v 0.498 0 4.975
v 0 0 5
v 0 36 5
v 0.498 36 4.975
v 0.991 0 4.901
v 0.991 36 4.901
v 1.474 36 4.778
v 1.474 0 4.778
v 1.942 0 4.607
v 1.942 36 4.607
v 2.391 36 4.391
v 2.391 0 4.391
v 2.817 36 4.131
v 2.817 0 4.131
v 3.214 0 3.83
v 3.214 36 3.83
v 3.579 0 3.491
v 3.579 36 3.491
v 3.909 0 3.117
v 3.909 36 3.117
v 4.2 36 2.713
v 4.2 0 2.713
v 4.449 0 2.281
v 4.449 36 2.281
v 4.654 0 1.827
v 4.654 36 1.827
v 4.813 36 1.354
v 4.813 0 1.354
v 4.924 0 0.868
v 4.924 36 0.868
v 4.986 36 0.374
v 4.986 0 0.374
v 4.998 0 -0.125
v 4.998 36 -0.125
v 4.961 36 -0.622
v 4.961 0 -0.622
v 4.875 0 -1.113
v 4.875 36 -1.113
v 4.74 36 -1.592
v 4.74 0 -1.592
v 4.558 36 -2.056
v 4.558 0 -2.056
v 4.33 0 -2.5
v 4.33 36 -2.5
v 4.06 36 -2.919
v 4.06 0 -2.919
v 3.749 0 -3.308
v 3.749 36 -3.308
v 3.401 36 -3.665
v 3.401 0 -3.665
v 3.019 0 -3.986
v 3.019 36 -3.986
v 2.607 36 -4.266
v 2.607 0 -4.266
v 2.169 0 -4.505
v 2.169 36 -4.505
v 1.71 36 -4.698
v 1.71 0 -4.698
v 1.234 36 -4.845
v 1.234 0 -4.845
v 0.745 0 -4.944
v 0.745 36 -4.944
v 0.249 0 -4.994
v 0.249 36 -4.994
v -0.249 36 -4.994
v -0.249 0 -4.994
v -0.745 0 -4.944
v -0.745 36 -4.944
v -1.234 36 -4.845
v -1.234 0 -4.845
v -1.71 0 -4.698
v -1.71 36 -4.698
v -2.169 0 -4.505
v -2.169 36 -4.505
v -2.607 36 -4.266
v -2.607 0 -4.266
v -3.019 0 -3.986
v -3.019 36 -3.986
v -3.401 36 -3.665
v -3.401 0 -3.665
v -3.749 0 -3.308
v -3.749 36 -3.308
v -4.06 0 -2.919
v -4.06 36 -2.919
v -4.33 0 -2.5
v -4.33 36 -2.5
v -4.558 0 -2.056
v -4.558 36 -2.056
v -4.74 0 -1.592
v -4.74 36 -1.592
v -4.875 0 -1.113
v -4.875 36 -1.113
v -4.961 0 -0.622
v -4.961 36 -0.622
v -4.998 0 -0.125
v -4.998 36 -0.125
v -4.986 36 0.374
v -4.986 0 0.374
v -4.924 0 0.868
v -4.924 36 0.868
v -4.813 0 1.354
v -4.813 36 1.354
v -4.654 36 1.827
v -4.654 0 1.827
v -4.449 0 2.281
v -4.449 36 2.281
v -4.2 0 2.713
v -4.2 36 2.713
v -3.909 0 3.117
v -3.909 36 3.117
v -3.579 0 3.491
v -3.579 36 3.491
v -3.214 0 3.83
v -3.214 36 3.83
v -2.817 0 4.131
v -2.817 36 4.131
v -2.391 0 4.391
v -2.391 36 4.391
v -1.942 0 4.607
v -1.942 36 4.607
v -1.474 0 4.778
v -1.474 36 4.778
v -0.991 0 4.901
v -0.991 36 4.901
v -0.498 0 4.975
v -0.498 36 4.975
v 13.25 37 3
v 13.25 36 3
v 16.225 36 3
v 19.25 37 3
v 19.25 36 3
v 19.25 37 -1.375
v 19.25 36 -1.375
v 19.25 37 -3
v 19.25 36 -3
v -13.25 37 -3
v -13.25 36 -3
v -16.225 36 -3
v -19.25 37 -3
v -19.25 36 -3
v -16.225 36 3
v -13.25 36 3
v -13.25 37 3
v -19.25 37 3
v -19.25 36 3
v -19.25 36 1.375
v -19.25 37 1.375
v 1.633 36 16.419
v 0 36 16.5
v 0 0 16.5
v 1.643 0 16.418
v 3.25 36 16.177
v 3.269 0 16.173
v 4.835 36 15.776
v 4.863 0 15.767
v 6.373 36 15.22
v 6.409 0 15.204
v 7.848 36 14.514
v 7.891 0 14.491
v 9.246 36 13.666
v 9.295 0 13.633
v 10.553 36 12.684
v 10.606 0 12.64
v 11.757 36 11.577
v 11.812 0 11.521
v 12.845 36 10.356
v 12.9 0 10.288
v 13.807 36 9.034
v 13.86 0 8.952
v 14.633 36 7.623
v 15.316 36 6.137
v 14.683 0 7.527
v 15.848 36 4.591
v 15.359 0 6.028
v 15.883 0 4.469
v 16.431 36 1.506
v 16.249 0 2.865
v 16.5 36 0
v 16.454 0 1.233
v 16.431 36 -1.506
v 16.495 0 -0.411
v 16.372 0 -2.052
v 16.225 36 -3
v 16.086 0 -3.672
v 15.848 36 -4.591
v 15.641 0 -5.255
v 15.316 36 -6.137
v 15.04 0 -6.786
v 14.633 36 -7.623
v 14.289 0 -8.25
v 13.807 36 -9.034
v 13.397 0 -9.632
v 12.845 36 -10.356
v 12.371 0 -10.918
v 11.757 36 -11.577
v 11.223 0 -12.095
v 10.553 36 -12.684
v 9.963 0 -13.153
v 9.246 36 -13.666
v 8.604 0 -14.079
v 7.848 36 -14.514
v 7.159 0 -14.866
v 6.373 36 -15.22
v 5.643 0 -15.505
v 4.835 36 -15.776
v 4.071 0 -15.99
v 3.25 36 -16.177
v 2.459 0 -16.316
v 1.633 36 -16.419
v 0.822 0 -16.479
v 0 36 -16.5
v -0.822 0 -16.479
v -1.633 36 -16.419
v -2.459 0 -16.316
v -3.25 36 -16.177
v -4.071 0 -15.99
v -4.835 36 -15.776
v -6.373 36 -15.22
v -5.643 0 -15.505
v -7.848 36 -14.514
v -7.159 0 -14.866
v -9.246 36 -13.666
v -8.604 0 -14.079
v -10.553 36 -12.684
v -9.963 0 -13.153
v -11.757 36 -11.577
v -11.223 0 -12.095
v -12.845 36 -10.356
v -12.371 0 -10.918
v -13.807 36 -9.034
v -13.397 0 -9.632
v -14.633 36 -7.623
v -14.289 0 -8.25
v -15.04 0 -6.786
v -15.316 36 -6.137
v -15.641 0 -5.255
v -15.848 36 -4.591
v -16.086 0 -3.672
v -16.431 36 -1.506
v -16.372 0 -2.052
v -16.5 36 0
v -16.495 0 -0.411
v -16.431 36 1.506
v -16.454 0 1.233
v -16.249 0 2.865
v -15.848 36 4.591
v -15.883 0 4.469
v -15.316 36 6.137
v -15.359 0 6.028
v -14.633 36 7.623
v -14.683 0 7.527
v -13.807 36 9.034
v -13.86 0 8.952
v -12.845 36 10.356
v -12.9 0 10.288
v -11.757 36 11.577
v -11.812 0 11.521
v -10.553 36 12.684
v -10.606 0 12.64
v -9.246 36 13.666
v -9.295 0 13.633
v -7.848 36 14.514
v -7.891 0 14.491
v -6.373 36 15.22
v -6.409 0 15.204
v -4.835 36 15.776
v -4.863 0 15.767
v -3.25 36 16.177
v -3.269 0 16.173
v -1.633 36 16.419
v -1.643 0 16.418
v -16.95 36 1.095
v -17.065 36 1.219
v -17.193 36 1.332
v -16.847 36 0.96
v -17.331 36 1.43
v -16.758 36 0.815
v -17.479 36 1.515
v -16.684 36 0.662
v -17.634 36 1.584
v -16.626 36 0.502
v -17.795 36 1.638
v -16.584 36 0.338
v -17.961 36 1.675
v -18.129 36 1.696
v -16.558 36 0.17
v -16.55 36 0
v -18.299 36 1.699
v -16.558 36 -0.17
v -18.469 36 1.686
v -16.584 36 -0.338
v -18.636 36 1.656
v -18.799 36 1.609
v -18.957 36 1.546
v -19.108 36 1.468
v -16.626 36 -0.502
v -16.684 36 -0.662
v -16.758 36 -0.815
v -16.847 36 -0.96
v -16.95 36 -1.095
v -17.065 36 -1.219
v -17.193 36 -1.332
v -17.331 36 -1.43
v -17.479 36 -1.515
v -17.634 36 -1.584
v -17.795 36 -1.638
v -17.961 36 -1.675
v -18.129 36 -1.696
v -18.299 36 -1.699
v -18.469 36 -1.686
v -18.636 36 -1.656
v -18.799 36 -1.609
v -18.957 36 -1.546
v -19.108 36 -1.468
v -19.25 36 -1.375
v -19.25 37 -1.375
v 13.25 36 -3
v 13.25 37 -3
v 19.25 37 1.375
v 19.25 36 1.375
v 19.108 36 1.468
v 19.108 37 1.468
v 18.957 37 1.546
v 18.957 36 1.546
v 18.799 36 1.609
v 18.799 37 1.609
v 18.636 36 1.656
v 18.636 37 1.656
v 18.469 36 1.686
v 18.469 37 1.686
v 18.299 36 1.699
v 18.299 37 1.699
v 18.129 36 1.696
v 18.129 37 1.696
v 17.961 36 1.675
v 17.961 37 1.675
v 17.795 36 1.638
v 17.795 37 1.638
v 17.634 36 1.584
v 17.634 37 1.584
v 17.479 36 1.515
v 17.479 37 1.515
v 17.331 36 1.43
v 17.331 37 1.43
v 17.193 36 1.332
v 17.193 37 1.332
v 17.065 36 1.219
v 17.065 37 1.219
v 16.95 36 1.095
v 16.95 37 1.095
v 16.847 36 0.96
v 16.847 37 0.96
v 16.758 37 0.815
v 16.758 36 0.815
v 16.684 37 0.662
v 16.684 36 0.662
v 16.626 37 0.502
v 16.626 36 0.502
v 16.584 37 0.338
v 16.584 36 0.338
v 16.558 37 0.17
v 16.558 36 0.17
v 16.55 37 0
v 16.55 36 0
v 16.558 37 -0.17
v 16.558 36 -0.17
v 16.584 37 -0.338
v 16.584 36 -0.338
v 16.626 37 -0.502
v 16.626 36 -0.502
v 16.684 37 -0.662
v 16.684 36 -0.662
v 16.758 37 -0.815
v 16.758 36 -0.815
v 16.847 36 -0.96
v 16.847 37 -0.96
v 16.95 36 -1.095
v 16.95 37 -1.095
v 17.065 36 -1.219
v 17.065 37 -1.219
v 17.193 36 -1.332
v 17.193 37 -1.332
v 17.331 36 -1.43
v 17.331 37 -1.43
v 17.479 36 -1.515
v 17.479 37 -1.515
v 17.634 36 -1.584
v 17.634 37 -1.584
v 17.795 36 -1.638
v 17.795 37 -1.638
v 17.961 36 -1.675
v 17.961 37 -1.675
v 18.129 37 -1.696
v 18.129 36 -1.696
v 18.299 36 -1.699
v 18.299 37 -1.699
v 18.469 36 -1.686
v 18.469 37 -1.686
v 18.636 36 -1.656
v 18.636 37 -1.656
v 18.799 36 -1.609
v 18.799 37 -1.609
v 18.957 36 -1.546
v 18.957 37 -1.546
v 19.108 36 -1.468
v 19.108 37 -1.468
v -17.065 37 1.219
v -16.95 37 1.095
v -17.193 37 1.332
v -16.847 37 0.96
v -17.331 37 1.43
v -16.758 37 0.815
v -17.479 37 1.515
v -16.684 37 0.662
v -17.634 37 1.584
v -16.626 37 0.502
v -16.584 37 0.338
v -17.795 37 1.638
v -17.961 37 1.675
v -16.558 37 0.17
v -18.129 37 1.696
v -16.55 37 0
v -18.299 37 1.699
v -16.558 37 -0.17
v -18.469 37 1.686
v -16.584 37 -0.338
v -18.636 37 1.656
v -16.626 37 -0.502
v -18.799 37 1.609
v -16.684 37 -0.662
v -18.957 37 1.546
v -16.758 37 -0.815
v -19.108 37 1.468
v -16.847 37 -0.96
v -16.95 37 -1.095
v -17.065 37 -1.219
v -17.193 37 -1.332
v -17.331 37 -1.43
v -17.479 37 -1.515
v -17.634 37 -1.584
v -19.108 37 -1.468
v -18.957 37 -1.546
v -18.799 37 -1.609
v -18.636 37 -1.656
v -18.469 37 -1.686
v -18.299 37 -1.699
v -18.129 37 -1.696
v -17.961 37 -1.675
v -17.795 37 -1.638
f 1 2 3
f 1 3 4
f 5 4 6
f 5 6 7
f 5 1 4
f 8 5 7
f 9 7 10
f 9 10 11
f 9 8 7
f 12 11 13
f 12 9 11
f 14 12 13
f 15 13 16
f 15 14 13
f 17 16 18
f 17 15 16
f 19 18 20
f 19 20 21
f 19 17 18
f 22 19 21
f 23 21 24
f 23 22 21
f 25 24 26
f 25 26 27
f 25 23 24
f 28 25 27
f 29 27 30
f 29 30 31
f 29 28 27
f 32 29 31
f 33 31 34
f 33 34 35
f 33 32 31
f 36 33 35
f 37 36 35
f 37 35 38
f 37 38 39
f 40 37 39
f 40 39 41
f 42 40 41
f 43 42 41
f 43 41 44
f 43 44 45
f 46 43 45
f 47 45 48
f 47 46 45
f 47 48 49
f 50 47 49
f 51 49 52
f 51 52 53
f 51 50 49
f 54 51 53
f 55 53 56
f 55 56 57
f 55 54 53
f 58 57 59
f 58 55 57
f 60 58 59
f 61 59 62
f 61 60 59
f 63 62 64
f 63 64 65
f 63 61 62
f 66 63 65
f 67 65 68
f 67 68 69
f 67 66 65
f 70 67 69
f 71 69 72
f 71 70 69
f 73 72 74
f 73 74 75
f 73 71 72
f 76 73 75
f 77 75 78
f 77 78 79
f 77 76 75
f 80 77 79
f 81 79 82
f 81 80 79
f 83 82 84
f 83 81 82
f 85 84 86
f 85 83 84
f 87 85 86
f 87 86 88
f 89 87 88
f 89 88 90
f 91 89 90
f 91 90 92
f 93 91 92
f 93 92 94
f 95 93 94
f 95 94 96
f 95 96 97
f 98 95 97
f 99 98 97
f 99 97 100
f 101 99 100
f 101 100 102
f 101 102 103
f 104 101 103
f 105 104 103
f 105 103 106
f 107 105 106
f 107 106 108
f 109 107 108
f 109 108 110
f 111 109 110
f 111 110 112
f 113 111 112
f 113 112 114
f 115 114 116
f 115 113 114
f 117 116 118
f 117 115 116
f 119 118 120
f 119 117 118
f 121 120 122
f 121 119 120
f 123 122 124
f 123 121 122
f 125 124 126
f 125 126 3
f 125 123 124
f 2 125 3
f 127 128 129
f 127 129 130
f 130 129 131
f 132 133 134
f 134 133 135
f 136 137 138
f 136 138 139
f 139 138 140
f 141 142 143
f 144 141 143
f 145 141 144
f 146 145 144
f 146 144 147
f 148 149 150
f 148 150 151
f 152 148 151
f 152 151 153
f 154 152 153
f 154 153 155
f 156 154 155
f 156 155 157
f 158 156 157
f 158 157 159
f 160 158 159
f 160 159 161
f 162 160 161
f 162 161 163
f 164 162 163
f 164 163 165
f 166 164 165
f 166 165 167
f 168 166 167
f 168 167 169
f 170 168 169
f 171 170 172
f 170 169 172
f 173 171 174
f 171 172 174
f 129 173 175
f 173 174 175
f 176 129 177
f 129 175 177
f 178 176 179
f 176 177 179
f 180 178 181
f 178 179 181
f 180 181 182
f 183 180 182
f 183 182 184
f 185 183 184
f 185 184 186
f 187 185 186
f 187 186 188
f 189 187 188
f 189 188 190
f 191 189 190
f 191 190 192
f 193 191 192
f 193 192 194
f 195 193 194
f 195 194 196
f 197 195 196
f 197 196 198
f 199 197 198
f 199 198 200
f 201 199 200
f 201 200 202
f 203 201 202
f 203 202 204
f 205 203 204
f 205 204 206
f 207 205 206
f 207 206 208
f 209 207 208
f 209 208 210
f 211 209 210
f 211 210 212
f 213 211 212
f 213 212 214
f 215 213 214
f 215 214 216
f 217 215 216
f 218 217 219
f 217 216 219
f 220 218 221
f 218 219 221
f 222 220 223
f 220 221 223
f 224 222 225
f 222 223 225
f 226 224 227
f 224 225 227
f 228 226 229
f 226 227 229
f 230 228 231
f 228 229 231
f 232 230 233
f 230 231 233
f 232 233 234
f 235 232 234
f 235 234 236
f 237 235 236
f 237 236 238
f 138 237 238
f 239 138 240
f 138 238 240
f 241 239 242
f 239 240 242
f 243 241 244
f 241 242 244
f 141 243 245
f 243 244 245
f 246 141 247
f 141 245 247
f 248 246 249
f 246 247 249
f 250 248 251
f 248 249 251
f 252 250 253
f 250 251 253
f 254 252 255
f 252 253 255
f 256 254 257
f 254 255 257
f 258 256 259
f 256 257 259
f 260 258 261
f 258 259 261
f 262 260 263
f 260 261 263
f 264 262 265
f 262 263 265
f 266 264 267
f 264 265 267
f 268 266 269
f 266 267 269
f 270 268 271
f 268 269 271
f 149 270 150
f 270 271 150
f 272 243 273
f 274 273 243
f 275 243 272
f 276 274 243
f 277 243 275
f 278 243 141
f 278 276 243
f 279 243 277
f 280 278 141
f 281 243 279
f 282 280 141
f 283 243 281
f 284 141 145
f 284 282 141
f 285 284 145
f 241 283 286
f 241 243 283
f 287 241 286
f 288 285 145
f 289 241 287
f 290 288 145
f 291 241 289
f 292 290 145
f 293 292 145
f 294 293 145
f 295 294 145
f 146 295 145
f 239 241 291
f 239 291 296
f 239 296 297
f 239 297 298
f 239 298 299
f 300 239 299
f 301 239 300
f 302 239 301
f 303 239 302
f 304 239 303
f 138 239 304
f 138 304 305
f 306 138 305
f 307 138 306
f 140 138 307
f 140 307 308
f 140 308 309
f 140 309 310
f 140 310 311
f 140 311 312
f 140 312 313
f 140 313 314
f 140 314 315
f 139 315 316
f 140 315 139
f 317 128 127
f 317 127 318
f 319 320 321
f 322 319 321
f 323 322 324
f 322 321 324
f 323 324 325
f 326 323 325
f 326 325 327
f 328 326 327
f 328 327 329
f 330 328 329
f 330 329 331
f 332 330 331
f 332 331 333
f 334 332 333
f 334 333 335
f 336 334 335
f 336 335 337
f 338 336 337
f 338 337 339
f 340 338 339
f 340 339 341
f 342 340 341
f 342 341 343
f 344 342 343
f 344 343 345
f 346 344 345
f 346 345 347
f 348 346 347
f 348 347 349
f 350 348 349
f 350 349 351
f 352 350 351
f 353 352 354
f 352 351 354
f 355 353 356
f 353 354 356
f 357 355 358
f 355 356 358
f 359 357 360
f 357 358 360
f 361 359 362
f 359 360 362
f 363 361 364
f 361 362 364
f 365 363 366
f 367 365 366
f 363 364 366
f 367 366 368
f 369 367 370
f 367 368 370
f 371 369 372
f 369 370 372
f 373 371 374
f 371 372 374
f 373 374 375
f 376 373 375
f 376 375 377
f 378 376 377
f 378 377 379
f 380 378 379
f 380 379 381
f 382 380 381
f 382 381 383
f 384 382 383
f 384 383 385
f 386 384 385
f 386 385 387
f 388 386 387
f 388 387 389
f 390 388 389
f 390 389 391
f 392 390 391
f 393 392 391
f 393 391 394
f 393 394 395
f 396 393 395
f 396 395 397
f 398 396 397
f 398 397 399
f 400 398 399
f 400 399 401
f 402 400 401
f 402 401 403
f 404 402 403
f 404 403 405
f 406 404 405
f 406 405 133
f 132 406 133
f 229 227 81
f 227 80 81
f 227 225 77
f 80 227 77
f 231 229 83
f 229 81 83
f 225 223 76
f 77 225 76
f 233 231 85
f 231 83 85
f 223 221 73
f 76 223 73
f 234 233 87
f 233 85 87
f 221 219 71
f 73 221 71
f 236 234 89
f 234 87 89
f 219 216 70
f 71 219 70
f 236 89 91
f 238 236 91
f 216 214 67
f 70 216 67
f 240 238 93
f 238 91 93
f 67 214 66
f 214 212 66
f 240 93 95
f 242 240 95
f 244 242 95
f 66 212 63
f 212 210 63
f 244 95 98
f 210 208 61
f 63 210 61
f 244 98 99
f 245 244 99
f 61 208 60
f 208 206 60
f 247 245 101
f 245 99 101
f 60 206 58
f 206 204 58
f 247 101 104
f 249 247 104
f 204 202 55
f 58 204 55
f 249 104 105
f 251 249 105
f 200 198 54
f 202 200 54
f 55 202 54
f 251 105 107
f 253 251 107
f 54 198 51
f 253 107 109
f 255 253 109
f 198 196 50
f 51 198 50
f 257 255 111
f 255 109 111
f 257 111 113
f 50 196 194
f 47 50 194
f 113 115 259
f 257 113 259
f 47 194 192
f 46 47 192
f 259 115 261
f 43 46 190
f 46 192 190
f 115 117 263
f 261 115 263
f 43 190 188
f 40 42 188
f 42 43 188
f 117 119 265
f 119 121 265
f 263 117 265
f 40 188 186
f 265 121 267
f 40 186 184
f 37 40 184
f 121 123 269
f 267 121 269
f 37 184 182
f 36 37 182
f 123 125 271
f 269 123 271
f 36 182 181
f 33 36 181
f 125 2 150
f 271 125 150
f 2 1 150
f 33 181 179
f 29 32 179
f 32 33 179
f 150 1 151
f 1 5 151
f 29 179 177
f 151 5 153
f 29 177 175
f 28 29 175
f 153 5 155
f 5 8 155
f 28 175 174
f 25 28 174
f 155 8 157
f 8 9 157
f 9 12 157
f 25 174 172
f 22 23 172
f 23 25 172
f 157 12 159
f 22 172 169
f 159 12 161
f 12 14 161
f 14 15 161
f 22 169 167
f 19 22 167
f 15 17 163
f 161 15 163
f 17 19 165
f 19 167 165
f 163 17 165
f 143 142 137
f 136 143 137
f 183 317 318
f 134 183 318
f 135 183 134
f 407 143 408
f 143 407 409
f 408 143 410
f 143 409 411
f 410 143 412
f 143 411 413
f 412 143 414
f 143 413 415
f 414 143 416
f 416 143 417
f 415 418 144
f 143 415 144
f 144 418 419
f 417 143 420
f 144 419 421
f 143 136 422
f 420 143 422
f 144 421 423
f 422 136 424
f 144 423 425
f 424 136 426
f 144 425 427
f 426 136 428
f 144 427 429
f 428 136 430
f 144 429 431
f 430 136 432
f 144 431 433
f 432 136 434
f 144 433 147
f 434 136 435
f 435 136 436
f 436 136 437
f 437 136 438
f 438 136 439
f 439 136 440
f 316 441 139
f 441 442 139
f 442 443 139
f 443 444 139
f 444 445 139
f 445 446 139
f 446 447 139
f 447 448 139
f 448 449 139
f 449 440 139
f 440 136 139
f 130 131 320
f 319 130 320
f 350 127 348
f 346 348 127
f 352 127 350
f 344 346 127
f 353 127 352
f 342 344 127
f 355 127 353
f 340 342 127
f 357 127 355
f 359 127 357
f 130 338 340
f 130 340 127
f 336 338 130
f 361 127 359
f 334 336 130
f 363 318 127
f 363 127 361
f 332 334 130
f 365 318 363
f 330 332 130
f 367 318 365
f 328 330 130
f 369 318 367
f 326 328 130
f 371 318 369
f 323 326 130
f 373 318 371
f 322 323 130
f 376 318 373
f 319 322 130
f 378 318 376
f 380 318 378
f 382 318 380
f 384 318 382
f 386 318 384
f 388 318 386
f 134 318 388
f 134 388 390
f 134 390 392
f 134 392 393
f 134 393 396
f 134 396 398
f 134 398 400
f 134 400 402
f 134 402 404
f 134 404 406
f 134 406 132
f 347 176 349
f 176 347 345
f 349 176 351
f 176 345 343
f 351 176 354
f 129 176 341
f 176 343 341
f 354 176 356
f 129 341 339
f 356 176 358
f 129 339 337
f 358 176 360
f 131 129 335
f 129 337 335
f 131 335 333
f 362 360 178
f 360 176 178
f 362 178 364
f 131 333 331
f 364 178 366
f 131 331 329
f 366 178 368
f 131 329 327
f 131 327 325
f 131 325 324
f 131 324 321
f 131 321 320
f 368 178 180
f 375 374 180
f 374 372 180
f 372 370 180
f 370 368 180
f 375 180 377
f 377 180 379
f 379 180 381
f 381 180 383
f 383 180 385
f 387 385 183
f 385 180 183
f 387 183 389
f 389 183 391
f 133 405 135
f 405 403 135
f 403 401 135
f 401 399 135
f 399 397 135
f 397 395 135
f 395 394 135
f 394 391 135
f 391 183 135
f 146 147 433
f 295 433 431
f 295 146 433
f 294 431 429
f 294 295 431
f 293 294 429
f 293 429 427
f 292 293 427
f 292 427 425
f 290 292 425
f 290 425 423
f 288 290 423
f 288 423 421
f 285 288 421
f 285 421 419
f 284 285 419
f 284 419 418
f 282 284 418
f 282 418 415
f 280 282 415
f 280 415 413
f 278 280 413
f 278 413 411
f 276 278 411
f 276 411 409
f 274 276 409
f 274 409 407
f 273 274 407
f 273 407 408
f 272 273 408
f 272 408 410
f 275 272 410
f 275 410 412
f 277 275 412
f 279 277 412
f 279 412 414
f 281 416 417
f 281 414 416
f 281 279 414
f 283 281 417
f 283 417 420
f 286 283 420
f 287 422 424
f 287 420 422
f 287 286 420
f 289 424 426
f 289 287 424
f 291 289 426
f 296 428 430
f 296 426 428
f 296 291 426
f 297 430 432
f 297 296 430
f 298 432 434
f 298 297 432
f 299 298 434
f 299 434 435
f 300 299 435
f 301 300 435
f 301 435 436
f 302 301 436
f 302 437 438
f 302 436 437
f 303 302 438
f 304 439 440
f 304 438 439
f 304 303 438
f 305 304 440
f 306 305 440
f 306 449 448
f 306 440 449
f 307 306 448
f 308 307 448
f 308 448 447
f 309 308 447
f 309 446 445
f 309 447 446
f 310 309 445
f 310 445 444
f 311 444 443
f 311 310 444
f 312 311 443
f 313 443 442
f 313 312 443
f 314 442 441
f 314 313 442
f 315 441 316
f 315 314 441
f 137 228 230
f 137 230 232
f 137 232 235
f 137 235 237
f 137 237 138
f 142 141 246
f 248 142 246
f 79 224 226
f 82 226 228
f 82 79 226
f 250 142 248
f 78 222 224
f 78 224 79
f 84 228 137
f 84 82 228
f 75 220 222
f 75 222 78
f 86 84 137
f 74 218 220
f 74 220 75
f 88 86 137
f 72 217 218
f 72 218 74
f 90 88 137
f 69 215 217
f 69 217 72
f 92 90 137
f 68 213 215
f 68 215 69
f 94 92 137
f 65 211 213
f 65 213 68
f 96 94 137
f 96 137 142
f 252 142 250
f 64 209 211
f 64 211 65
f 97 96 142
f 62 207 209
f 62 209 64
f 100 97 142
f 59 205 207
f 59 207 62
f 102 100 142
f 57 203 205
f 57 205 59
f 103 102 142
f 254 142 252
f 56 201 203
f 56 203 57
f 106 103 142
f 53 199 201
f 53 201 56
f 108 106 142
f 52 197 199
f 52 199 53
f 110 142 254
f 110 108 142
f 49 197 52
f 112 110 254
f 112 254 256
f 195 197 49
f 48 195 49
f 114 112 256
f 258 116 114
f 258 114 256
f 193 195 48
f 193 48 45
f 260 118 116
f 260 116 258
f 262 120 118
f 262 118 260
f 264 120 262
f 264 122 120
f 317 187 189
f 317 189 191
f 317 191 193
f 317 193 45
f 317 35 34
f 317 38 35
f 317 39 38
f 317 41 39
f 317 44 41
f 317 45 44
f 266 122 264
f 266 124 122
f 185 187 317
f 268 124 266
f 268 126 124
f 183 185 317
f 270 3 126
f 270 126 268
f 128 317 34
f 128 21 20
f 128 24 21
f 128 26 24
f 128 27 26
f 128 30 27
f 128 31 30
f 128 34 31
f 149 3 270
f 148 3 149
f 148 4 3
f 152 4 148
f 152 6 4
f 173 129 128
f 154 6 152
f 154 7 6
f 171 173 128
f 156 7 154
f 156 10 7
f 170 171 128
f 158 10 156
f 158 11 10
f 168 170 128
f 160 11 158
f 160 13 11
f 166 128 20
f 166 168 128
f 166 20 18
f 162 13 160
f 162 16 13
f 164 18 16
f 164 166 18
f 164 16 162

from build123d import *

# Parameters (mm, degrees)
SKETCH1_R            = 16.5
SKETCH1_R_2          = 5
BOSS_EXTRUDE1_DEPTH  = 36
SKETCH2_W            = 6
SKETCH2_H            = 6
BOSS_EXTRUDE2_DEPTH  = 1
M3_CLEARANCE_HOLE1_D = 3.4


with BuildPart() as part:
    # Sketch1 → Boss-Extrude1 (new body)
    with BuildSketch(Plane(origin=(0, 0, 0), x_dir=(1, 0, 0), z_dir=(0, 1, 0))):
        with Locations(Location((0, 0, 0), (0, 0, 270))):
            Circle(SKETCH1_R)
        with Locations(Location((0, 0, 0), (0, 0, 270))):
            Circle(SKETCH1_R_2, mode=Mode.SUBTRACT)
    extrude(amount=BOSS_EXTRUDE1_DEPTH)

    # Sketch2 → Boss-Extrude2 (add)
    with BuildSketch(Plane(origin=(0, 36, 0), x_dir=(1, 0, 0), z_dir=(0, 1, 0))):
        with Locations((16.25, 0)):
            Rectangle(SKETCH2_W, SKETCH2_H)
    boss_extrude2 = extrude(amount=BOSS_EXTRUDE2_DEPTH)

    # M3 Clearance Hole1 (through all)
    with Locations(Plane(origin=(0, 37, 0), x_dir=(1, 0, 0), z_dir=(0, 1, 0))):
        with Locations((18.25, 0)):
            m3_clearance_hole1 = Hole(M3_CLEARANCE_HOLE1_D / 2)

    # Mirror1: Boss-Extrude2, M3 Clearance Hole1 across plane
    add(boss_extrude2.mirror(Plane(origin=(0, 0, 0), x_dir=(0, 0, 1), z_dir=(1, 0, 0))))
    add(m3_clearance_hole1.mirror(Plane(origin=(0, 0, 0), x_dir=(0, 0, 1), z_dir=(1, 0, 0))), mode=Mode.SUBTRACT)


solid = part.part
